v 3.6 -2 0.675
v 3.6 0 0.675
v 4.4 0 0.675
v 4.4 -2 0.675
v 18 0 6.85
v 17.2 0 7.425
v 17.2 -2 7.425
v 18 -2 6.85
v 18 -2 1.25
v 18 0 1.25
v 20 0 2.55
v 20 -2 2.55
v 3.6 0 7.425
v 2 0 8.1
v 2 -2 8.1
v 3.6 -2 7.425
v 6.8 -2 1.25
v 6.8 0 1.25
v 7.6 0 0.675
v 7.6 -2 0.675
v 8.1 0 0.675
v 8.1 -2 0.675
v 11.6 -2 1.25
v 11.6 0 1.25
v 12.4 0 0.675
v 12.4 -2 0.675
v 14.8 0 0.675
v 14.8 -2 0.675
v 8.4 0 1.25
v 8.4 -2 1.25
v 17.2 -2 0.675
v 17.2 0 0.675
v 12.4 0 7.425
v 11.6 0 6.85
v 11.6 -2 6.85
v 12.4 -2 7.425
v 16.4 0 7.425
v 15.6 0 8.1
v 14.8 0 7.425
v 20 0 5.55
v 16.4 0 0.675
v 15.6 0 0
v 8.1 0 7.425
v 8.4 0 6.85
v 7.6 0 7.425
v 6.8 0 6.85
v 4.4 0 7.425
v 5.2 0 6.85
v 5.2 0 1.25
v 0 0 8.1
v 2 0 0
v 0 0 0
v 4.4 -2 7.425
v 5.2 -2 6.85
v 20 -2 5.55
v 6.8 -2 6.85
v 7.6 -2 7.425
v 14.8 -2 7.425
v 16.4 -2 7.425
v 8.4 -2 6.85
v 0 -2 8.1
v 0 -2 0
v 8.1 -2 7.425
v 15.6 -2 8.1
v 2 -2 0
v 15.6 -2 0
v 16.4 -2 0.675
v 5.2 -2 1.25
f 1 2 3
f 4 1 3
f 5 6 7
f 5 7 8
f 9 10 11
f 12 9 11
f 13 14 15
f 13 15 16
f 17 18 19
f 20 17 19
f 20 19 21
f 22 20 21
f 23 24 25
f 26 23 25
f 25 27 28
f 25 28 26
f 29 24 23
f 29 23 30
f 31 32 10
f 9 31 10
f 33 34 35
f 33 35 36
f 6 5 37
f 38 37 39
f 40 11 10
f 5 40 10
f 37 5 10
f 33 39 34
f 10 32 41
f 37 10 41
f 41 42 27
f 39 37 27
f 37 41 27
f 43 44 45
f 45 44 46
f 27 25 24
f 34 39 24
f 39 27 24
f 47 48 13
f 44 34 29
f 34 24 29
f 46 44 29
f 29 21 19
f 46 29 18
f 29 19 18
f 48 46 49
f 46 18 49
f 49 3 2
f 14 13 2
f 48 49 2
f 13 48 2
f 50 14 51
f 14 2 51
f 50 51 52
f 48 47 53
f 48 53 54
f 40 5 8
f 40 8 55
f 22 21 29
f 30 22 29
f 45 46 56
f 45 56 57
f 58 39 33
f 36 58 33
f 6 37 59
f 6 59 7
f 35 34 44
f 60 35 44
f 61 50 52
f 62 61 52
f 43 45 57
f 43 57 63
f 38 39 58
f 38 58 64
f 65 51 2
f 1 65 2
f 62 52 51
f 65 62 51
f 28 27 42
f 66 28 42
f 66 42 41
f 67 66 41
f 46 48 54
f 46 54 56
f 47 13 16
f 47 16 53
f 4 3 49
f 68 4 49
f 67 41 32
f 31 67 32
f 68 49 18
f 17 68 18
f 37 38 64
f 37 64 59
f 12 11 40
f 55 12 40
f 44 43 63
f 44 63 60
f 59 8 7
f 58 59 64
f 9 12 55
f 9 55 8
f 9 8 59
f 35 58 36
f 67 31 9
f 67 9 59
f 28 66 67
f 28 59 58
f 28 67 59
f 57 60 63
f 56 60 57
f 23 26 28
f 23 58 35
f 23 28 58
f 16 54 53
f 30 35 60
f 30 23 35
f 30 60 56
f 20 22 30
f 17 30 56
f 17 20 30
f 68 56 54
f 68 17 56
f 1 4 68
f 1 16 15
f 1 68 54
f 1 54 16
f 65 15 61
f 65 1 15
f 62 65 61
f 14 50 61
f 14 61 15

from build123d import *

# Parameters (mm, degrees)
PAD_DEPTH = 2


with BuildPart() as part:
    # Sketch → Pad (new body)
    with BuildSketch(Plane.XZ):
        Polygon((2, 8.1), (3.6, 7.425), (4.4, 7.425), (5.2, 6.85), (6.8, 6.85), (7.6, 7.425), (8.1, 7.425), (8.4, 6.85), (10, 6.85), (11.6, 6.85), (12.4, 7.425), (13.2, 7.425), (14.8, 7.425), (15.6, 8.1), (16.4, 7.425), (17.2, 7.425), (18, 6.85), (20, 5.55), (20, 4.05), (0, 4.05), (0, 8.1), align=None)
    pad = extrude(amount=PAD_DEPTH)

    # Mirrored: Pad across Sketch Axis8
    add(pad.mirror(Plane(origin=(0, 0, 4.05), x_dir=(0, -1, 0), z_dir=(0, 0, 1))))


solid = part.part
